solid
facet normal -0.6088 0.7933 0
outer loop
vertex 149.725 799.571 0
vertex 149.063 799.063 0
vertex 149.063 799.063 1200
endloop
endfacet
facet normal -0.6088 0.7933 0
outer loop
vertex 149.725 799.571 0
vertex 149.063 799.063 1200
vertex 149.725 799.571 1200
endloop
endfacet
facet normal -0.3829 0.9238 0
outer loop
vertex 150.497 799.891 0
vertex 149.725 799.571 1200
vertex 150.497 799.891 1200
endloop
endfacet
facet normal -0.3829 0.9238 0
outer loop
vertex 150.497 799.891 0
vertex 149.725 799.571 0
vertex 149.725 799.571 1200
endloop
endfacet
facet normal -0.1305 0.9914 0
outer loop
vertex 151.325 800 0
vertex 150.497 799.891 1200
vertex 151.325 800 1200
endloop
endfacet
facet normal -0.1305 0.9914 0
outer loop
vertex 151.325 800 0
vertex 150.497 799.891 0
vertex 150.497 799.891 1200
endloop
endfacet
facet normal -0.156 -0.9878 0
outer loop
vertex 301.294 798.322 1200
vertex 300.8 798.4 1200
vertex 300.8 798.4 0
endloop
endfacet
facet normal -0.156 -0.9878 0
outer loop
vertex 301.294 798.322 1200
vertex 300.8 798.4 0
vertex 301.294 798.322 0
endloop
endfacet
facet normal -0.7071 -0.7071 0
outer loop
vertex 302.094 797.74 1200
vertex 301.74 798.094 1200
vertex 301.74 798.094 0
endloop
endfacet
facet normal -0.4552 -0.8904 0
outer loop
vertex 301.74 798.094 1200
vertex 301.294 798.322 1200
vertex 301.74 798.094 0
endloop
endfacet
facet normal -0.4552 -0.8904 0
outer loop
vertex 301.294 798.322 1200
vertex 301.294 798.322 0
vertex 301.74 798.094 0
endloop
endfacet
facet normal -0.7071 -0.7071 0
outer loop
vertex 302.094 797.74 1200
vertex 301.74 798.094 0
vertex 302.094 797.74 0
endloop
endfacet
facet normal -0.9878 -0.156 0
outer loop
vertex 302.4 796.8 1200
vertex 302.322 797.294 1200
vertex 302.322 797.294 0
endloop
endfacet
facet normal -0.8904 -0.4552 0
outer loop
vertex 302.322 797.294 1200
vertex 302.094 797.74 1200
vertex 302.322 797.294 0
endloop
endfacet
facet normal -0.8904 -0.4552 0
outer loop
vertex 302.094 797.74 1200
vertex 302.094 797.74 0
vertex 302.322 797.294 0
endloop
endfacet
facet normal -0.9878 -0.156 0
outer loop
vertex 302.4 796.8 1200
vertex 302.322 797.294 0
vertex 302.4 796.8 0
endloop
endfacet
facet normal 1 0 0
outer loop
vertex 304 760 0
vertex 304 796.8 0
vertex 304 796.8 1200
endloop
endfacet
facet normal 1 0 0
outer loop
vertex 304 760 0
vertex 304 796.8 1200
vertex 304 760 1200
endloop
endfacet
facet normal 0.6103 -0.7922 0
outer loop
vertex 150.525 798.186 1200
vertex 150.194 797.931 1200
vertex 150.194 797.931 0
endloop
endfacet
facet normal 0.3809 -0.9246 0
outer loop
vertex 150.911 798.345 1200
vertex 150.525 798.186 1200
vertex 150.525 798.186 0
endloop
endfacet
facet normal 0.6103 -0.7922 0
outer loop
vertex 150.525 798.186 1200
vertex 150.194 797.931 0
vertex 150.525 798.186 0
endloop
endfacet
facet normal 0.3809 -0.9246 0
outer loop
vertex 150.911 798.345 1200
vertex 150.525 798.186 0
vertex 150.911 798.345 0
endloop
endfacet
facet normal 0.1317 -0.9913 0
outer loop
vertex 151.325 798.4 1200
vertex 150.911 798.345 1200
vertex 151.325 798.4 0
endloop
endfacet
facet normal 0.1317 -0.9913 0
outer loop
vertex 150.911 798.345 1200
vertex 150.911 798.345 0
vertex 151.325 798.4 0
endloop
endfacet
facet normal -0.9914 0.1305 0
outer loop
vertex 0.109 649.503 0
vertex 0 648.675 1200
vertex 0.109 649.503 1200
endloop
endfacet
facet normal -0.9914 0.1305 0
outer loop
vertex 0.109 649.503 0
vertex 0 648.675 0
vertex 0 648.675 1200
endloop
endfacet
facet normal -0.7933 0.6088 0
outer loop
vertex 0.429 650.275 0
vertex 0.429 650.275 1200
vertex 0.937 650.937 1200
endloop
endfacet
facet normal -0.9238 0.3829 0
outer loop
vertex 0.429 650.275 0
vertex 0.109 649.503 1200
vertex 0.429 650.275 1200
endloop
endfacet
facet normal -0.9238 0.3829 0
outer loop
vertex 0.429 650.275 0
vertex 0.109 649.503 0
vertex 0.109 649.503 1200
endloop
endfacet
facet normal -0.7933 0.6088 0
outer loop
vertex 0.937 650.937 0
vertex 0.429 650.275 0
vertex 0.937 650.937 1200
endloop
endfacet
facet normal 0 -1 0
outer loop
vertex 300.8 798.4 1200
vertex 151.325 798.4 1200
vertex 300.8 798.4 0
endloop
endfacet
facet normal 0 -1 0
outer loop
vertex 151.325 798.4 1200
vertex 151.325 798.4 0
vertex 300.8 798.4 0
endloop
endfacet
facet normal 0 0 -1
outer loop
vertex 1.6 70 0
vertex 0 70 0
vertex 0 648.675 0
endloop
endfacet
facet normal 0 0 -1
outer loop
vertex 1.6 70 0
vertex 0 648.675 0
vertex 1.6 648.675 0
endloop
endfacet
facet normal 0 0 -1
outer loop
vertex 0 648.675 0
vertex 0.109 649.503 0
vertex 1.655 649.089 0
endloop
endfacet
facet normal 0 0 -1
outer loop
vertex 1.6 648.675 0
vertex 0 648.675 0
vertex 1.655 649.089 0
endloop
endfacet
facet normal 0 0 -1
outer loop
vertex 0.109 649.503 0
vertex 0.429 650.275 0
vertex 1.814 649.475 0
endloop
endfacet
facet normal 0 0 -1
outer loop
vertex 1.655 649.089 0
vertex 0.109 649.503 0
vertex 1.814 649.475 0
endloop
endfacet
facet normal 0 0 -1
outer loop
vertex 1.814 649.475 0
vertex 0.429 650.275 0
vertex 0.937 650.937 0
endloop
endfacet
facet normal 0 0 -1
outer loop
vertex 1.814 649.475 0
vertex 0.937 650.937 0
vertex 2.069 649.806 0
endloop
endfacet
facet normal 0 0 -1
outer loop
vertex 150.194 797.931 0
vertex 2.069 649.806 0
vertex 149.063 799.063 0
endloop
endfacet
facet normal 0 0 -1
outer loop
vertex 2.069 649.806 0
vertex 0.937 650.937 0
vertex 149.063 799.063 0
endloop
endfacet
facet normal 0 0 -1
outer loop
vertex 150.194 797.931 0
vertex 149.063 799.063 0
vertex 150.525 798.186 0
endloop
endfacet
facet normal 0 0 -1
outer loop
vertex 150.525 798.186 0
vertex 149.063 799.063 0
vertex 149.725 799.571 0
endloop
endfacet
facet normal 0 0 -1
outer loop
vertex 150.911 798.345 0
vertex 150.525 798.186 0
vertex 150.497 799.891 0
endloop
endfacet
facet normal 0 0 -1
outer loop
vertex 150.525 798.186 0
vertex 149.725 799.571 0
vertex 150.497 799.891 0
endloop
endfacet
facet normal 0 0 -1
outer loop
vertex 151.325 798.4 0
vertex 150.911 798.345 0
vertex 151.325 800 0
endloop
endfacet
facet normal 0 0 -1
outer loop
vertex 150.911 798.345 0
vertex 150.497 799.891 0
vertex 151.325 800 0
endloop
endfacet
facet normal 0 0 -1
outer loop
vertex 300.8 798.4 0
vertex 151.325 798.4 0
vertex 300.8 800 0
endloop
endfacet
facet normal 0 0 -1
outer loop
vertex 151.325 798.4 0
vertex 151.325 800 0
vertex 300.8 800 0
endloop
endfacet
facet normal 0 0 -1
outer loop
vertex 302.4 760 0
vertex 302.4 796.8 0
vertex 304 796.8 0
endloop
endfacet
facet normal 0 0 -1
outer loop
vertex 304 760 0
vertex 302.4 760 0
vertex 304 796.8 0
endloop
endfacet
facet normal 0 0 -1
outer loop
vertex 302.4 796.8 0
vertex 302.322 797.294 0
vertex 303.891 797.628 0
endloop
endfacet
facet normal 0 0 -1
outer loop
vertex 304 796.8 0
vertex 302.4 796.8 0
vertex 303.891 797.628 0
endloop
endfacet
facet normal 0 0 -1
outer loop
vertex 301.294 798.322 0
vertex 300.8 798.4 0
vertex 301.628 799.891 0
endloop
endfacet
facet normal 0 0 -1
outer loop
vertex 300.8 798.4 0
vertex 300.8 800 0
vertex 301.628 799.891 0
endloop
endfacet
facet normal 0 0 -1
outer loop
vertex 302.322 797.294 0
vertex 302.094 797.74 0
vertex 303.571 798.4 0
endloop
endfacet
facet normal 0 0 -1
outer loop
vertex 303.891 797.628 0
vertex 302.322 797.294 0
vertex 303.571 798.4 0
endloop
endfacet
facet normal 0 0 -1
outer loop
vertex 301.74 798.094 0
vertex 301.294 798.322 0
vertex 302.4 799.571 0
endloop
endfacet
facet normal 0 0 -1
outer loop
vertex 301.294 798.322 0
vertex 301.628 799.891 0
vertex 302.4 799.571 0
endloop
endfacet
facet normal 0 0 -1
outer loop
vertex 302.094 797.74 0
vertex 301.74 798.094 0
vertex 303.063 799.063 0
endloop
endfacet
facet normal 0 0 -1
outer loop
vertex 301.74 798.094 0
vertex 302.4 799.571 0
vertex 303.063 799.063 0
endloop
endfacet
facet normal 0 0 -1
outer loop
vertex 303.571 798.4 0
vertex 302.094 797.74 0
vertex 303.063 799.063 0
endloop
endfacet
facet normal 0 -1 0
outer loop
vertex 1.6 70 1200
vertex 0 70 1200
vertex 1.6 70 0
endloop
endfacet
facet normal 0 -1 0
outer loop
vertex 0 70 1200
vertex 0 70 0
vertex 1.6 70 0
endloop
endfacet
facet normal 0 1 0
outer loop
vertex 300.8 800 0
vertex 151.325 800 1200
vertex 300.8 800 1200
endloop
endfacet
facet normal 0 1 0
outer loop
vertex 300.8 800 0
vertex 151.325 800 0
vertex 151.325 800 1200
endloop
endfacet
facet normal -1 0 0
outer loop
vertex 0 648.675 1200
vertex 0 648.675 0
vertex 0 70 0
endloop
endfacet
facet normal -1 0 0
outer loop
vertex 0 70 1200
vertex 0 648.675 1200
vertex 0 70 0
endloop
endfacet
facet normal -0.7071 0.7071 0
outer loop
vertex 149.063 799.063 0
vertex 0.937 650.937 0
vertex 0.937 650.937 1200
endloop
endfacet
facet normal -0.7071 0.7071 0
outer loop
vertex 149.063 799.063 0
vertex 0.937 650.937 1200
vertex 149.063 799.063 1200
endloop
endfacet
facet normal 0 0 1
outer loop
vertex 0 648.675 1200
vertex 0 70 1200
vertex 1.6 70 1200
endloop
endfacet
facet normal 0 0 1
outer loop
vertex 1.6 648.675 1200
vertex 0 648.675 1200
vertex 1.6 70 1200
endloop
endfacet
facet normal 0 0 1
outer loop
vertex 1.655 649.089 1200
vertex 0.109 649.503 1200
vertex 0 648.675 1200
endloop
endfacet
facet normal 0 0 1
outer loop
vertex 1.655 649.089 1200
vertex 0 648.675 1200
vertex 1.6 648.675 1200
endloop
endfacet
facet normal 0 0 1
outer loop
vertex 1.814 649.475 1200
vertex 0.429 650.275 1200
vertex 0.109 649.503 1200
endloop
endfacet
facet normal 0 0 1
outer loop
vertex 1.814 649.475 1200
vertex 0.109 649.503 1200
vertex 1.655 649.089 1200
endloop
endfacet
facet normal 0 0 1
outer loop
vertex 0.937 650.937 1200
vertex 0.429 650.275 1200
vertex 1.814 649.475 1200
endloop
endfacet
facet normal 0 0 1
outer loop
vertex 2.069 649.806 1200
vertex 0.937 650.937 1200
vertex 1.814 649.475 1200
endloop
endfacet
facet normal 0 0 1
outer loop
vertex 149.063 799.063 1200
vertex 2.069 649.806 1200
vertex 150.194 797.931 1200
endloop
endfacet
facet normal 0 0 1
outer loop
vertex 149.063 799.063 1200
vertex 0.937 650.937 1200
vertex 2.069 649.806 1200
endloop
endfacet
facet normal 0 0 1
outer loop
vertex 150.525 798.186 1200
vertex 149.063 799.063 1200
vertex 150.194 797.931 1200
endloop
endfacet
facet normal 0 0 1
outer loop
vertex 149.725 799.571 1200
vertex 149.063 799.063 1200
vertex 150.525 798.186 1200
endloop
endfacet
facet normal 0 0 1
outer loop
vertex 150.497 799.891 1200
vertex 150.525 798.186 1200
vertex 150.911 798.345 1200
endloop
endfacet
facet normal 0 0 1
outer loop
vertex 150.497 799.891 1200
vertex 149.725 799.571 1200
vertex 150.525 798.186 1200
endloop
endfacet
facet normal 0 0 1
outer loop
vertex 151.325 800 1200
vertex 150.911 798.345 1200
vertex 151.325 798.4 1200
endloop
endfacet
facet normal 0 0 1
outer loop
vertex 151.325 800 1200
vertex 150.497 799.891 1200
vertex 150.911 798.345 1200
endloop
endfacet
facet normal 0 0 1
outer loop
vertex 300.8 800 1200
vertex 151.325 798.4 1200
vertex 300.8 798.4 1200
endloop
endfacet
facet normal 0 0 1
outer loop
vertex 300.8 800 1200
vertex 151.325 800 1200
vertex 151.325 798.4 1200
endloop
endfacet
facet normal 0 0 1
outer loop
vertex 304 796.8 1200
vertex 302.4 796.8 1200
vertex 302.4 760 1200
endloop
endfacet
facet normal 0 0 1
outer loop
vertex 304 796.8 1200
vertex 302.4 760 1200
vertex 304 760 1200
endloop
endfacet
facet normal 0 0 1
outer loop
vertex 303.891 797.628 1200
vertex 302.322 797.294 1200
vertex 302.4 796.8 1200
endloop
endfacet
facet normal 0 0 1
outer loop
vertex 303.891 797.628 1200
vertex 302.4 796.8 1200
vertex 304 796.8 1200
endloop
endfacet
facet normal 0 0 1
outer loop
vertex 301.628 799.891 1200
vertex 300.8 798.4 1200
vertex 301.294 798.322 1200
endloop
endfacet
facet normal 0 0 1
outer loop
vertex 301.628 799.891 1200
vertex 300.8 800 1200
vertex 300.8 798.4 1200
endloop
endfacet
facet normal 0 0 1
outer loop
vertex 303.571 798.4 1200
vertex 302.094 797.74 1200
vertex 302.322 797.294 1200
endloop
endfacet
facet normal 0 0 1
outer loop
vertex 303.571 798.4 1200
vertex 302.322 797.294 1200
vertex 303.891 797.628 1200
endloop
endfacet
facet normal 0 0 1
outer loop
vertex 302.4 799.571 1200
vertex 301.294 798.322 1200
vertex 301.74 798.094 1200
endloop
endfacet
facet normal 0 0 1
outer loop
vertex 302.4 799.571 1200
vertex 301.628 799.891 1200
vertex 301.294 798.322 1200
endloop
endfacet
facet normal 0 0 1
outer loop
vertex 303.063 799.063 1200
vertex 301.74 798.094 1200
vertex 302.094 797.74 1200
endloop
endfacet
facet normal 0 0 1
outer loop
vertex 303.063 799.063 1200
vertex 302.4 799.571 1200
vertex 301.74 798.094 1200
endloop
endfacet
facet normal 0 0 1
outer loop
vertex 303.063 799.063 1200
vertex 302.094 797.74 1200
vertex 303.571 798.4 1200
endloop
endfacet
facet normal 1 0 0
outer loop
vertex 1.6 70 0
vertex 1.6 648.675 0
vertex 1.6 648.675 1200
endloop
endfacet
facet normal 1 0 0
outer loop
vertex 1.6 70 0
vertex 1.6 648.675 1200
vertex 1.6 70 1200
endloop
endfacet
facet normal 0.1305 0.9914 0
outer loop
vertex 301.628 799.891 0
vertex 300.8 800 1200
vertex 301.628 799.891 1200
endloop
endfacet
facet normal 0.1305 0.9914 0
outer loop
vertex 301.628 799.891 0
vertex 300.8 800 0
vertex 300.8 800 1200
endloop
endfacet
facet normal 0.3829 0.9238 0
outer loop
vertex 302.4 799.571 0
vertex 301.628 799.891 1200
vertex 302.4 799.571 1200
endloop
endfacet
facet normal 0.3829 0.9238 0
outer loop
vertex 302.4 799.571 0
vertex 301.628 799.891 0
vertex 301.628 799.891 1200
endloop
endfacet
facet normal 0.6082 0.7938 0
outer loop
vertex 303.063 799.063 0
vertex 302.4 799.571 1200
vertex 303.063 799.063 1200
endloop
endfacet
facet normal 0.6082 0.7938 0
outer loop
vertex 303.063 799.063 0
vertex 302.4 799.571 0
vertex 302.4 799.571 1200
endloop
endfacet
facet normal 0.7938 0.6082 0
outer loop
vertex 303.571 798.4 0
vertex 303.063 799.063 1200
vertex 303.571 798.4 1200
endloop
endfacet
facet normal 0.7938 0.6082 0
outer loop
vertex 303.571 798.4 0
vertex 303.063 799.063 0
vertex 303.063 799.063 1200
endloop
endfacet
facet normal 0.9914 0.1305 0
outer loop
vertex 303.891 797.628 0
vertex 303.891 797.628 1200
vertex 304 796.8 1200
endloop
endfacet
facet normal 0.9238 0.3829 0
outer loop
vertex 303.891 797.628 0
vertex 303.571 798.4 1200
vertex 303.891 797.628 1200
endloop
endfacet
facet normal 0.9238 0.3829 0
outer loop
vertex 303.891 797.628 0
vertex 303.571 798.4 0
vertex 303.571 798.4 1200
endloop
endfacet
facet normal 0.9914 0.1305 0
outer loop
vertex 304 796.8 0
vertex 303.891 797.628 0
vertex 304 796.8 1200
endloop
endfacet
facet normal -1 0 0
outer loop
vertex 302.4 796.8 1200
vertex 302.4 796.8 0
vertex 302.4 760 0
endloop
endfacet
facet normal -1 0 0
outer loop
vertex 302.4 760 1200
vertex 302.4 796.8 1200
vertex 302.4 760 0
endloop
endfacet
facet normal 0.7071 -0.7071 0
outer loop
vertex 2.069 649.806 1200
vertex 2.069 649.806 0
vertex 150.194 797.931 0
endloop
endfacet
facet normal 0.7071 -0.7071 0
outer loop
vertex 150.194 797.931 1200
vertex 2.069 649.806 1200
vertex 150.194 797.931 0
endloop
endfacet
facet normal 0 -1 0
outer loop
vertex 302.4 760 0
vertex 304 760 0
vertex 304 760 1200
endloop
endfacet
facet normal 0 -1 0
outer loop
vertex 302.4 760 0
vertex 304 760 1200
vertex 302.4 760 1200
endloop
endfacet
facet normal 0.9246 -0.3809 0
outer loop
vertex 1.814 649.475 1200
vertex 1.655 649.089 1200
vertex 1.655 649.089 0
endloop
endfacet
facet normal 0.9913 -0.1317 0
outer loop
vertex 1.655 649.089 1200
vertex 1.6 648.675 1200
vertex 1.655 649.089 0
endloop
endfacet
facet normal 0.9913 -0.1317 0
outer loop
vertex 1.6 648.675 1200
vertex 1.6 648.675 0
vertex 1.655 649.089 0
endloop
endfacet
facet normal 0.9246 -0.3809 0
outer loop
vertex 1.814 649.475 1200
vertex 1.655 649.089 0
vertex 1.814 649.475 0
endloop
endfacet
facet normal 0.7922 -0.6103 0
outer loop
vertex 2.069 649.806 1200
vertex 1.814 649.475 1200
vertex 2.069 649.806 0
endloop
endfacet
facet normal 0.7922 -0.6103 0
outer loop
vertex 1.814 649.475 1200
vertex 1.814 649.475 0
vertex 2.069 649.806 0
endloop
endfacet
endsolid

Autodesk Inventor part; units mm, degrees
ref_plane "YZ Plane" through (0, 0, 0) normal (1, 0, 0) x (0, 1, 0)
ref_plane "XZ Plane" through (0, 0, 0) normal (0, 1, 0) x (-1, 0, 0)
ref_plane "XY Plane" through (0, 0, 0) normal (0, 0, 1) x (1, 0, 0)
sketch "Sketch1" plane through (0, 0, 0) normal (0, 0, 1) x (1, 0, 0)
  line L0 (0, 650) -> (150, 800)
  line L1 (150, 800) -> (304, 800)
  line L2 (304, 800) -> (304, 760)
  line L3 (0, 650) -> (0, 70)
  point P0 (0, 0)
  dimension "d3" = 154
  dimension "d25" = 800
  dimension "d26" = 150
  dimension "d27" = 40
  dimension "d28" = 135
  dimension "d29" = 580
  dimension "d30" = 70
contour flange "Contour Flange1" sketch "Sketch1" thickness 1.6 bend radius 1.6 width 1200 along (0, 0, 1) mid plane no both sides no wall seen from (0, 360, 0) lies toward (1, 0, 0) curves L3 L0 L1 L2
bend "Bend1"
corner "Corner1"
equation "\"d4\" = Thickness"
equation "\"d5\" = BendReliefWidth"
equation "\"d6\" = BendReliefDepth"
equation "\"d7\" = MinimumRemnant"
equation "\"d8\" = TransitionRadius"
equation "\"d10\" = BendRadius"
equation "\"d12\" = CornerReliefSize"
equation "\"d13\" = GapSize"
equation "\"d14\" = JacobiRadiusSize"
equation "\"BendRadius\" = Thickness"
equation "\"BendReliefWidth\" = Thickness"
equation "\"BendReliefDepth\" = 0.5 * Thickness"
equation "\"CornerReliefSize\" = 4 * Thickness"
equation "\"MinimumRemnant\" = 2 * Thickness"
equation "\"TransitionRadius\" = BendRadius"
equation "\"JacobiRadiusSize\" = BendRadius"
equation "\"GapSize\" = Thickness"
equation "\"Thickness\" = 1.6"
properties part number "Front Cover with Cent point" material "Steel"
